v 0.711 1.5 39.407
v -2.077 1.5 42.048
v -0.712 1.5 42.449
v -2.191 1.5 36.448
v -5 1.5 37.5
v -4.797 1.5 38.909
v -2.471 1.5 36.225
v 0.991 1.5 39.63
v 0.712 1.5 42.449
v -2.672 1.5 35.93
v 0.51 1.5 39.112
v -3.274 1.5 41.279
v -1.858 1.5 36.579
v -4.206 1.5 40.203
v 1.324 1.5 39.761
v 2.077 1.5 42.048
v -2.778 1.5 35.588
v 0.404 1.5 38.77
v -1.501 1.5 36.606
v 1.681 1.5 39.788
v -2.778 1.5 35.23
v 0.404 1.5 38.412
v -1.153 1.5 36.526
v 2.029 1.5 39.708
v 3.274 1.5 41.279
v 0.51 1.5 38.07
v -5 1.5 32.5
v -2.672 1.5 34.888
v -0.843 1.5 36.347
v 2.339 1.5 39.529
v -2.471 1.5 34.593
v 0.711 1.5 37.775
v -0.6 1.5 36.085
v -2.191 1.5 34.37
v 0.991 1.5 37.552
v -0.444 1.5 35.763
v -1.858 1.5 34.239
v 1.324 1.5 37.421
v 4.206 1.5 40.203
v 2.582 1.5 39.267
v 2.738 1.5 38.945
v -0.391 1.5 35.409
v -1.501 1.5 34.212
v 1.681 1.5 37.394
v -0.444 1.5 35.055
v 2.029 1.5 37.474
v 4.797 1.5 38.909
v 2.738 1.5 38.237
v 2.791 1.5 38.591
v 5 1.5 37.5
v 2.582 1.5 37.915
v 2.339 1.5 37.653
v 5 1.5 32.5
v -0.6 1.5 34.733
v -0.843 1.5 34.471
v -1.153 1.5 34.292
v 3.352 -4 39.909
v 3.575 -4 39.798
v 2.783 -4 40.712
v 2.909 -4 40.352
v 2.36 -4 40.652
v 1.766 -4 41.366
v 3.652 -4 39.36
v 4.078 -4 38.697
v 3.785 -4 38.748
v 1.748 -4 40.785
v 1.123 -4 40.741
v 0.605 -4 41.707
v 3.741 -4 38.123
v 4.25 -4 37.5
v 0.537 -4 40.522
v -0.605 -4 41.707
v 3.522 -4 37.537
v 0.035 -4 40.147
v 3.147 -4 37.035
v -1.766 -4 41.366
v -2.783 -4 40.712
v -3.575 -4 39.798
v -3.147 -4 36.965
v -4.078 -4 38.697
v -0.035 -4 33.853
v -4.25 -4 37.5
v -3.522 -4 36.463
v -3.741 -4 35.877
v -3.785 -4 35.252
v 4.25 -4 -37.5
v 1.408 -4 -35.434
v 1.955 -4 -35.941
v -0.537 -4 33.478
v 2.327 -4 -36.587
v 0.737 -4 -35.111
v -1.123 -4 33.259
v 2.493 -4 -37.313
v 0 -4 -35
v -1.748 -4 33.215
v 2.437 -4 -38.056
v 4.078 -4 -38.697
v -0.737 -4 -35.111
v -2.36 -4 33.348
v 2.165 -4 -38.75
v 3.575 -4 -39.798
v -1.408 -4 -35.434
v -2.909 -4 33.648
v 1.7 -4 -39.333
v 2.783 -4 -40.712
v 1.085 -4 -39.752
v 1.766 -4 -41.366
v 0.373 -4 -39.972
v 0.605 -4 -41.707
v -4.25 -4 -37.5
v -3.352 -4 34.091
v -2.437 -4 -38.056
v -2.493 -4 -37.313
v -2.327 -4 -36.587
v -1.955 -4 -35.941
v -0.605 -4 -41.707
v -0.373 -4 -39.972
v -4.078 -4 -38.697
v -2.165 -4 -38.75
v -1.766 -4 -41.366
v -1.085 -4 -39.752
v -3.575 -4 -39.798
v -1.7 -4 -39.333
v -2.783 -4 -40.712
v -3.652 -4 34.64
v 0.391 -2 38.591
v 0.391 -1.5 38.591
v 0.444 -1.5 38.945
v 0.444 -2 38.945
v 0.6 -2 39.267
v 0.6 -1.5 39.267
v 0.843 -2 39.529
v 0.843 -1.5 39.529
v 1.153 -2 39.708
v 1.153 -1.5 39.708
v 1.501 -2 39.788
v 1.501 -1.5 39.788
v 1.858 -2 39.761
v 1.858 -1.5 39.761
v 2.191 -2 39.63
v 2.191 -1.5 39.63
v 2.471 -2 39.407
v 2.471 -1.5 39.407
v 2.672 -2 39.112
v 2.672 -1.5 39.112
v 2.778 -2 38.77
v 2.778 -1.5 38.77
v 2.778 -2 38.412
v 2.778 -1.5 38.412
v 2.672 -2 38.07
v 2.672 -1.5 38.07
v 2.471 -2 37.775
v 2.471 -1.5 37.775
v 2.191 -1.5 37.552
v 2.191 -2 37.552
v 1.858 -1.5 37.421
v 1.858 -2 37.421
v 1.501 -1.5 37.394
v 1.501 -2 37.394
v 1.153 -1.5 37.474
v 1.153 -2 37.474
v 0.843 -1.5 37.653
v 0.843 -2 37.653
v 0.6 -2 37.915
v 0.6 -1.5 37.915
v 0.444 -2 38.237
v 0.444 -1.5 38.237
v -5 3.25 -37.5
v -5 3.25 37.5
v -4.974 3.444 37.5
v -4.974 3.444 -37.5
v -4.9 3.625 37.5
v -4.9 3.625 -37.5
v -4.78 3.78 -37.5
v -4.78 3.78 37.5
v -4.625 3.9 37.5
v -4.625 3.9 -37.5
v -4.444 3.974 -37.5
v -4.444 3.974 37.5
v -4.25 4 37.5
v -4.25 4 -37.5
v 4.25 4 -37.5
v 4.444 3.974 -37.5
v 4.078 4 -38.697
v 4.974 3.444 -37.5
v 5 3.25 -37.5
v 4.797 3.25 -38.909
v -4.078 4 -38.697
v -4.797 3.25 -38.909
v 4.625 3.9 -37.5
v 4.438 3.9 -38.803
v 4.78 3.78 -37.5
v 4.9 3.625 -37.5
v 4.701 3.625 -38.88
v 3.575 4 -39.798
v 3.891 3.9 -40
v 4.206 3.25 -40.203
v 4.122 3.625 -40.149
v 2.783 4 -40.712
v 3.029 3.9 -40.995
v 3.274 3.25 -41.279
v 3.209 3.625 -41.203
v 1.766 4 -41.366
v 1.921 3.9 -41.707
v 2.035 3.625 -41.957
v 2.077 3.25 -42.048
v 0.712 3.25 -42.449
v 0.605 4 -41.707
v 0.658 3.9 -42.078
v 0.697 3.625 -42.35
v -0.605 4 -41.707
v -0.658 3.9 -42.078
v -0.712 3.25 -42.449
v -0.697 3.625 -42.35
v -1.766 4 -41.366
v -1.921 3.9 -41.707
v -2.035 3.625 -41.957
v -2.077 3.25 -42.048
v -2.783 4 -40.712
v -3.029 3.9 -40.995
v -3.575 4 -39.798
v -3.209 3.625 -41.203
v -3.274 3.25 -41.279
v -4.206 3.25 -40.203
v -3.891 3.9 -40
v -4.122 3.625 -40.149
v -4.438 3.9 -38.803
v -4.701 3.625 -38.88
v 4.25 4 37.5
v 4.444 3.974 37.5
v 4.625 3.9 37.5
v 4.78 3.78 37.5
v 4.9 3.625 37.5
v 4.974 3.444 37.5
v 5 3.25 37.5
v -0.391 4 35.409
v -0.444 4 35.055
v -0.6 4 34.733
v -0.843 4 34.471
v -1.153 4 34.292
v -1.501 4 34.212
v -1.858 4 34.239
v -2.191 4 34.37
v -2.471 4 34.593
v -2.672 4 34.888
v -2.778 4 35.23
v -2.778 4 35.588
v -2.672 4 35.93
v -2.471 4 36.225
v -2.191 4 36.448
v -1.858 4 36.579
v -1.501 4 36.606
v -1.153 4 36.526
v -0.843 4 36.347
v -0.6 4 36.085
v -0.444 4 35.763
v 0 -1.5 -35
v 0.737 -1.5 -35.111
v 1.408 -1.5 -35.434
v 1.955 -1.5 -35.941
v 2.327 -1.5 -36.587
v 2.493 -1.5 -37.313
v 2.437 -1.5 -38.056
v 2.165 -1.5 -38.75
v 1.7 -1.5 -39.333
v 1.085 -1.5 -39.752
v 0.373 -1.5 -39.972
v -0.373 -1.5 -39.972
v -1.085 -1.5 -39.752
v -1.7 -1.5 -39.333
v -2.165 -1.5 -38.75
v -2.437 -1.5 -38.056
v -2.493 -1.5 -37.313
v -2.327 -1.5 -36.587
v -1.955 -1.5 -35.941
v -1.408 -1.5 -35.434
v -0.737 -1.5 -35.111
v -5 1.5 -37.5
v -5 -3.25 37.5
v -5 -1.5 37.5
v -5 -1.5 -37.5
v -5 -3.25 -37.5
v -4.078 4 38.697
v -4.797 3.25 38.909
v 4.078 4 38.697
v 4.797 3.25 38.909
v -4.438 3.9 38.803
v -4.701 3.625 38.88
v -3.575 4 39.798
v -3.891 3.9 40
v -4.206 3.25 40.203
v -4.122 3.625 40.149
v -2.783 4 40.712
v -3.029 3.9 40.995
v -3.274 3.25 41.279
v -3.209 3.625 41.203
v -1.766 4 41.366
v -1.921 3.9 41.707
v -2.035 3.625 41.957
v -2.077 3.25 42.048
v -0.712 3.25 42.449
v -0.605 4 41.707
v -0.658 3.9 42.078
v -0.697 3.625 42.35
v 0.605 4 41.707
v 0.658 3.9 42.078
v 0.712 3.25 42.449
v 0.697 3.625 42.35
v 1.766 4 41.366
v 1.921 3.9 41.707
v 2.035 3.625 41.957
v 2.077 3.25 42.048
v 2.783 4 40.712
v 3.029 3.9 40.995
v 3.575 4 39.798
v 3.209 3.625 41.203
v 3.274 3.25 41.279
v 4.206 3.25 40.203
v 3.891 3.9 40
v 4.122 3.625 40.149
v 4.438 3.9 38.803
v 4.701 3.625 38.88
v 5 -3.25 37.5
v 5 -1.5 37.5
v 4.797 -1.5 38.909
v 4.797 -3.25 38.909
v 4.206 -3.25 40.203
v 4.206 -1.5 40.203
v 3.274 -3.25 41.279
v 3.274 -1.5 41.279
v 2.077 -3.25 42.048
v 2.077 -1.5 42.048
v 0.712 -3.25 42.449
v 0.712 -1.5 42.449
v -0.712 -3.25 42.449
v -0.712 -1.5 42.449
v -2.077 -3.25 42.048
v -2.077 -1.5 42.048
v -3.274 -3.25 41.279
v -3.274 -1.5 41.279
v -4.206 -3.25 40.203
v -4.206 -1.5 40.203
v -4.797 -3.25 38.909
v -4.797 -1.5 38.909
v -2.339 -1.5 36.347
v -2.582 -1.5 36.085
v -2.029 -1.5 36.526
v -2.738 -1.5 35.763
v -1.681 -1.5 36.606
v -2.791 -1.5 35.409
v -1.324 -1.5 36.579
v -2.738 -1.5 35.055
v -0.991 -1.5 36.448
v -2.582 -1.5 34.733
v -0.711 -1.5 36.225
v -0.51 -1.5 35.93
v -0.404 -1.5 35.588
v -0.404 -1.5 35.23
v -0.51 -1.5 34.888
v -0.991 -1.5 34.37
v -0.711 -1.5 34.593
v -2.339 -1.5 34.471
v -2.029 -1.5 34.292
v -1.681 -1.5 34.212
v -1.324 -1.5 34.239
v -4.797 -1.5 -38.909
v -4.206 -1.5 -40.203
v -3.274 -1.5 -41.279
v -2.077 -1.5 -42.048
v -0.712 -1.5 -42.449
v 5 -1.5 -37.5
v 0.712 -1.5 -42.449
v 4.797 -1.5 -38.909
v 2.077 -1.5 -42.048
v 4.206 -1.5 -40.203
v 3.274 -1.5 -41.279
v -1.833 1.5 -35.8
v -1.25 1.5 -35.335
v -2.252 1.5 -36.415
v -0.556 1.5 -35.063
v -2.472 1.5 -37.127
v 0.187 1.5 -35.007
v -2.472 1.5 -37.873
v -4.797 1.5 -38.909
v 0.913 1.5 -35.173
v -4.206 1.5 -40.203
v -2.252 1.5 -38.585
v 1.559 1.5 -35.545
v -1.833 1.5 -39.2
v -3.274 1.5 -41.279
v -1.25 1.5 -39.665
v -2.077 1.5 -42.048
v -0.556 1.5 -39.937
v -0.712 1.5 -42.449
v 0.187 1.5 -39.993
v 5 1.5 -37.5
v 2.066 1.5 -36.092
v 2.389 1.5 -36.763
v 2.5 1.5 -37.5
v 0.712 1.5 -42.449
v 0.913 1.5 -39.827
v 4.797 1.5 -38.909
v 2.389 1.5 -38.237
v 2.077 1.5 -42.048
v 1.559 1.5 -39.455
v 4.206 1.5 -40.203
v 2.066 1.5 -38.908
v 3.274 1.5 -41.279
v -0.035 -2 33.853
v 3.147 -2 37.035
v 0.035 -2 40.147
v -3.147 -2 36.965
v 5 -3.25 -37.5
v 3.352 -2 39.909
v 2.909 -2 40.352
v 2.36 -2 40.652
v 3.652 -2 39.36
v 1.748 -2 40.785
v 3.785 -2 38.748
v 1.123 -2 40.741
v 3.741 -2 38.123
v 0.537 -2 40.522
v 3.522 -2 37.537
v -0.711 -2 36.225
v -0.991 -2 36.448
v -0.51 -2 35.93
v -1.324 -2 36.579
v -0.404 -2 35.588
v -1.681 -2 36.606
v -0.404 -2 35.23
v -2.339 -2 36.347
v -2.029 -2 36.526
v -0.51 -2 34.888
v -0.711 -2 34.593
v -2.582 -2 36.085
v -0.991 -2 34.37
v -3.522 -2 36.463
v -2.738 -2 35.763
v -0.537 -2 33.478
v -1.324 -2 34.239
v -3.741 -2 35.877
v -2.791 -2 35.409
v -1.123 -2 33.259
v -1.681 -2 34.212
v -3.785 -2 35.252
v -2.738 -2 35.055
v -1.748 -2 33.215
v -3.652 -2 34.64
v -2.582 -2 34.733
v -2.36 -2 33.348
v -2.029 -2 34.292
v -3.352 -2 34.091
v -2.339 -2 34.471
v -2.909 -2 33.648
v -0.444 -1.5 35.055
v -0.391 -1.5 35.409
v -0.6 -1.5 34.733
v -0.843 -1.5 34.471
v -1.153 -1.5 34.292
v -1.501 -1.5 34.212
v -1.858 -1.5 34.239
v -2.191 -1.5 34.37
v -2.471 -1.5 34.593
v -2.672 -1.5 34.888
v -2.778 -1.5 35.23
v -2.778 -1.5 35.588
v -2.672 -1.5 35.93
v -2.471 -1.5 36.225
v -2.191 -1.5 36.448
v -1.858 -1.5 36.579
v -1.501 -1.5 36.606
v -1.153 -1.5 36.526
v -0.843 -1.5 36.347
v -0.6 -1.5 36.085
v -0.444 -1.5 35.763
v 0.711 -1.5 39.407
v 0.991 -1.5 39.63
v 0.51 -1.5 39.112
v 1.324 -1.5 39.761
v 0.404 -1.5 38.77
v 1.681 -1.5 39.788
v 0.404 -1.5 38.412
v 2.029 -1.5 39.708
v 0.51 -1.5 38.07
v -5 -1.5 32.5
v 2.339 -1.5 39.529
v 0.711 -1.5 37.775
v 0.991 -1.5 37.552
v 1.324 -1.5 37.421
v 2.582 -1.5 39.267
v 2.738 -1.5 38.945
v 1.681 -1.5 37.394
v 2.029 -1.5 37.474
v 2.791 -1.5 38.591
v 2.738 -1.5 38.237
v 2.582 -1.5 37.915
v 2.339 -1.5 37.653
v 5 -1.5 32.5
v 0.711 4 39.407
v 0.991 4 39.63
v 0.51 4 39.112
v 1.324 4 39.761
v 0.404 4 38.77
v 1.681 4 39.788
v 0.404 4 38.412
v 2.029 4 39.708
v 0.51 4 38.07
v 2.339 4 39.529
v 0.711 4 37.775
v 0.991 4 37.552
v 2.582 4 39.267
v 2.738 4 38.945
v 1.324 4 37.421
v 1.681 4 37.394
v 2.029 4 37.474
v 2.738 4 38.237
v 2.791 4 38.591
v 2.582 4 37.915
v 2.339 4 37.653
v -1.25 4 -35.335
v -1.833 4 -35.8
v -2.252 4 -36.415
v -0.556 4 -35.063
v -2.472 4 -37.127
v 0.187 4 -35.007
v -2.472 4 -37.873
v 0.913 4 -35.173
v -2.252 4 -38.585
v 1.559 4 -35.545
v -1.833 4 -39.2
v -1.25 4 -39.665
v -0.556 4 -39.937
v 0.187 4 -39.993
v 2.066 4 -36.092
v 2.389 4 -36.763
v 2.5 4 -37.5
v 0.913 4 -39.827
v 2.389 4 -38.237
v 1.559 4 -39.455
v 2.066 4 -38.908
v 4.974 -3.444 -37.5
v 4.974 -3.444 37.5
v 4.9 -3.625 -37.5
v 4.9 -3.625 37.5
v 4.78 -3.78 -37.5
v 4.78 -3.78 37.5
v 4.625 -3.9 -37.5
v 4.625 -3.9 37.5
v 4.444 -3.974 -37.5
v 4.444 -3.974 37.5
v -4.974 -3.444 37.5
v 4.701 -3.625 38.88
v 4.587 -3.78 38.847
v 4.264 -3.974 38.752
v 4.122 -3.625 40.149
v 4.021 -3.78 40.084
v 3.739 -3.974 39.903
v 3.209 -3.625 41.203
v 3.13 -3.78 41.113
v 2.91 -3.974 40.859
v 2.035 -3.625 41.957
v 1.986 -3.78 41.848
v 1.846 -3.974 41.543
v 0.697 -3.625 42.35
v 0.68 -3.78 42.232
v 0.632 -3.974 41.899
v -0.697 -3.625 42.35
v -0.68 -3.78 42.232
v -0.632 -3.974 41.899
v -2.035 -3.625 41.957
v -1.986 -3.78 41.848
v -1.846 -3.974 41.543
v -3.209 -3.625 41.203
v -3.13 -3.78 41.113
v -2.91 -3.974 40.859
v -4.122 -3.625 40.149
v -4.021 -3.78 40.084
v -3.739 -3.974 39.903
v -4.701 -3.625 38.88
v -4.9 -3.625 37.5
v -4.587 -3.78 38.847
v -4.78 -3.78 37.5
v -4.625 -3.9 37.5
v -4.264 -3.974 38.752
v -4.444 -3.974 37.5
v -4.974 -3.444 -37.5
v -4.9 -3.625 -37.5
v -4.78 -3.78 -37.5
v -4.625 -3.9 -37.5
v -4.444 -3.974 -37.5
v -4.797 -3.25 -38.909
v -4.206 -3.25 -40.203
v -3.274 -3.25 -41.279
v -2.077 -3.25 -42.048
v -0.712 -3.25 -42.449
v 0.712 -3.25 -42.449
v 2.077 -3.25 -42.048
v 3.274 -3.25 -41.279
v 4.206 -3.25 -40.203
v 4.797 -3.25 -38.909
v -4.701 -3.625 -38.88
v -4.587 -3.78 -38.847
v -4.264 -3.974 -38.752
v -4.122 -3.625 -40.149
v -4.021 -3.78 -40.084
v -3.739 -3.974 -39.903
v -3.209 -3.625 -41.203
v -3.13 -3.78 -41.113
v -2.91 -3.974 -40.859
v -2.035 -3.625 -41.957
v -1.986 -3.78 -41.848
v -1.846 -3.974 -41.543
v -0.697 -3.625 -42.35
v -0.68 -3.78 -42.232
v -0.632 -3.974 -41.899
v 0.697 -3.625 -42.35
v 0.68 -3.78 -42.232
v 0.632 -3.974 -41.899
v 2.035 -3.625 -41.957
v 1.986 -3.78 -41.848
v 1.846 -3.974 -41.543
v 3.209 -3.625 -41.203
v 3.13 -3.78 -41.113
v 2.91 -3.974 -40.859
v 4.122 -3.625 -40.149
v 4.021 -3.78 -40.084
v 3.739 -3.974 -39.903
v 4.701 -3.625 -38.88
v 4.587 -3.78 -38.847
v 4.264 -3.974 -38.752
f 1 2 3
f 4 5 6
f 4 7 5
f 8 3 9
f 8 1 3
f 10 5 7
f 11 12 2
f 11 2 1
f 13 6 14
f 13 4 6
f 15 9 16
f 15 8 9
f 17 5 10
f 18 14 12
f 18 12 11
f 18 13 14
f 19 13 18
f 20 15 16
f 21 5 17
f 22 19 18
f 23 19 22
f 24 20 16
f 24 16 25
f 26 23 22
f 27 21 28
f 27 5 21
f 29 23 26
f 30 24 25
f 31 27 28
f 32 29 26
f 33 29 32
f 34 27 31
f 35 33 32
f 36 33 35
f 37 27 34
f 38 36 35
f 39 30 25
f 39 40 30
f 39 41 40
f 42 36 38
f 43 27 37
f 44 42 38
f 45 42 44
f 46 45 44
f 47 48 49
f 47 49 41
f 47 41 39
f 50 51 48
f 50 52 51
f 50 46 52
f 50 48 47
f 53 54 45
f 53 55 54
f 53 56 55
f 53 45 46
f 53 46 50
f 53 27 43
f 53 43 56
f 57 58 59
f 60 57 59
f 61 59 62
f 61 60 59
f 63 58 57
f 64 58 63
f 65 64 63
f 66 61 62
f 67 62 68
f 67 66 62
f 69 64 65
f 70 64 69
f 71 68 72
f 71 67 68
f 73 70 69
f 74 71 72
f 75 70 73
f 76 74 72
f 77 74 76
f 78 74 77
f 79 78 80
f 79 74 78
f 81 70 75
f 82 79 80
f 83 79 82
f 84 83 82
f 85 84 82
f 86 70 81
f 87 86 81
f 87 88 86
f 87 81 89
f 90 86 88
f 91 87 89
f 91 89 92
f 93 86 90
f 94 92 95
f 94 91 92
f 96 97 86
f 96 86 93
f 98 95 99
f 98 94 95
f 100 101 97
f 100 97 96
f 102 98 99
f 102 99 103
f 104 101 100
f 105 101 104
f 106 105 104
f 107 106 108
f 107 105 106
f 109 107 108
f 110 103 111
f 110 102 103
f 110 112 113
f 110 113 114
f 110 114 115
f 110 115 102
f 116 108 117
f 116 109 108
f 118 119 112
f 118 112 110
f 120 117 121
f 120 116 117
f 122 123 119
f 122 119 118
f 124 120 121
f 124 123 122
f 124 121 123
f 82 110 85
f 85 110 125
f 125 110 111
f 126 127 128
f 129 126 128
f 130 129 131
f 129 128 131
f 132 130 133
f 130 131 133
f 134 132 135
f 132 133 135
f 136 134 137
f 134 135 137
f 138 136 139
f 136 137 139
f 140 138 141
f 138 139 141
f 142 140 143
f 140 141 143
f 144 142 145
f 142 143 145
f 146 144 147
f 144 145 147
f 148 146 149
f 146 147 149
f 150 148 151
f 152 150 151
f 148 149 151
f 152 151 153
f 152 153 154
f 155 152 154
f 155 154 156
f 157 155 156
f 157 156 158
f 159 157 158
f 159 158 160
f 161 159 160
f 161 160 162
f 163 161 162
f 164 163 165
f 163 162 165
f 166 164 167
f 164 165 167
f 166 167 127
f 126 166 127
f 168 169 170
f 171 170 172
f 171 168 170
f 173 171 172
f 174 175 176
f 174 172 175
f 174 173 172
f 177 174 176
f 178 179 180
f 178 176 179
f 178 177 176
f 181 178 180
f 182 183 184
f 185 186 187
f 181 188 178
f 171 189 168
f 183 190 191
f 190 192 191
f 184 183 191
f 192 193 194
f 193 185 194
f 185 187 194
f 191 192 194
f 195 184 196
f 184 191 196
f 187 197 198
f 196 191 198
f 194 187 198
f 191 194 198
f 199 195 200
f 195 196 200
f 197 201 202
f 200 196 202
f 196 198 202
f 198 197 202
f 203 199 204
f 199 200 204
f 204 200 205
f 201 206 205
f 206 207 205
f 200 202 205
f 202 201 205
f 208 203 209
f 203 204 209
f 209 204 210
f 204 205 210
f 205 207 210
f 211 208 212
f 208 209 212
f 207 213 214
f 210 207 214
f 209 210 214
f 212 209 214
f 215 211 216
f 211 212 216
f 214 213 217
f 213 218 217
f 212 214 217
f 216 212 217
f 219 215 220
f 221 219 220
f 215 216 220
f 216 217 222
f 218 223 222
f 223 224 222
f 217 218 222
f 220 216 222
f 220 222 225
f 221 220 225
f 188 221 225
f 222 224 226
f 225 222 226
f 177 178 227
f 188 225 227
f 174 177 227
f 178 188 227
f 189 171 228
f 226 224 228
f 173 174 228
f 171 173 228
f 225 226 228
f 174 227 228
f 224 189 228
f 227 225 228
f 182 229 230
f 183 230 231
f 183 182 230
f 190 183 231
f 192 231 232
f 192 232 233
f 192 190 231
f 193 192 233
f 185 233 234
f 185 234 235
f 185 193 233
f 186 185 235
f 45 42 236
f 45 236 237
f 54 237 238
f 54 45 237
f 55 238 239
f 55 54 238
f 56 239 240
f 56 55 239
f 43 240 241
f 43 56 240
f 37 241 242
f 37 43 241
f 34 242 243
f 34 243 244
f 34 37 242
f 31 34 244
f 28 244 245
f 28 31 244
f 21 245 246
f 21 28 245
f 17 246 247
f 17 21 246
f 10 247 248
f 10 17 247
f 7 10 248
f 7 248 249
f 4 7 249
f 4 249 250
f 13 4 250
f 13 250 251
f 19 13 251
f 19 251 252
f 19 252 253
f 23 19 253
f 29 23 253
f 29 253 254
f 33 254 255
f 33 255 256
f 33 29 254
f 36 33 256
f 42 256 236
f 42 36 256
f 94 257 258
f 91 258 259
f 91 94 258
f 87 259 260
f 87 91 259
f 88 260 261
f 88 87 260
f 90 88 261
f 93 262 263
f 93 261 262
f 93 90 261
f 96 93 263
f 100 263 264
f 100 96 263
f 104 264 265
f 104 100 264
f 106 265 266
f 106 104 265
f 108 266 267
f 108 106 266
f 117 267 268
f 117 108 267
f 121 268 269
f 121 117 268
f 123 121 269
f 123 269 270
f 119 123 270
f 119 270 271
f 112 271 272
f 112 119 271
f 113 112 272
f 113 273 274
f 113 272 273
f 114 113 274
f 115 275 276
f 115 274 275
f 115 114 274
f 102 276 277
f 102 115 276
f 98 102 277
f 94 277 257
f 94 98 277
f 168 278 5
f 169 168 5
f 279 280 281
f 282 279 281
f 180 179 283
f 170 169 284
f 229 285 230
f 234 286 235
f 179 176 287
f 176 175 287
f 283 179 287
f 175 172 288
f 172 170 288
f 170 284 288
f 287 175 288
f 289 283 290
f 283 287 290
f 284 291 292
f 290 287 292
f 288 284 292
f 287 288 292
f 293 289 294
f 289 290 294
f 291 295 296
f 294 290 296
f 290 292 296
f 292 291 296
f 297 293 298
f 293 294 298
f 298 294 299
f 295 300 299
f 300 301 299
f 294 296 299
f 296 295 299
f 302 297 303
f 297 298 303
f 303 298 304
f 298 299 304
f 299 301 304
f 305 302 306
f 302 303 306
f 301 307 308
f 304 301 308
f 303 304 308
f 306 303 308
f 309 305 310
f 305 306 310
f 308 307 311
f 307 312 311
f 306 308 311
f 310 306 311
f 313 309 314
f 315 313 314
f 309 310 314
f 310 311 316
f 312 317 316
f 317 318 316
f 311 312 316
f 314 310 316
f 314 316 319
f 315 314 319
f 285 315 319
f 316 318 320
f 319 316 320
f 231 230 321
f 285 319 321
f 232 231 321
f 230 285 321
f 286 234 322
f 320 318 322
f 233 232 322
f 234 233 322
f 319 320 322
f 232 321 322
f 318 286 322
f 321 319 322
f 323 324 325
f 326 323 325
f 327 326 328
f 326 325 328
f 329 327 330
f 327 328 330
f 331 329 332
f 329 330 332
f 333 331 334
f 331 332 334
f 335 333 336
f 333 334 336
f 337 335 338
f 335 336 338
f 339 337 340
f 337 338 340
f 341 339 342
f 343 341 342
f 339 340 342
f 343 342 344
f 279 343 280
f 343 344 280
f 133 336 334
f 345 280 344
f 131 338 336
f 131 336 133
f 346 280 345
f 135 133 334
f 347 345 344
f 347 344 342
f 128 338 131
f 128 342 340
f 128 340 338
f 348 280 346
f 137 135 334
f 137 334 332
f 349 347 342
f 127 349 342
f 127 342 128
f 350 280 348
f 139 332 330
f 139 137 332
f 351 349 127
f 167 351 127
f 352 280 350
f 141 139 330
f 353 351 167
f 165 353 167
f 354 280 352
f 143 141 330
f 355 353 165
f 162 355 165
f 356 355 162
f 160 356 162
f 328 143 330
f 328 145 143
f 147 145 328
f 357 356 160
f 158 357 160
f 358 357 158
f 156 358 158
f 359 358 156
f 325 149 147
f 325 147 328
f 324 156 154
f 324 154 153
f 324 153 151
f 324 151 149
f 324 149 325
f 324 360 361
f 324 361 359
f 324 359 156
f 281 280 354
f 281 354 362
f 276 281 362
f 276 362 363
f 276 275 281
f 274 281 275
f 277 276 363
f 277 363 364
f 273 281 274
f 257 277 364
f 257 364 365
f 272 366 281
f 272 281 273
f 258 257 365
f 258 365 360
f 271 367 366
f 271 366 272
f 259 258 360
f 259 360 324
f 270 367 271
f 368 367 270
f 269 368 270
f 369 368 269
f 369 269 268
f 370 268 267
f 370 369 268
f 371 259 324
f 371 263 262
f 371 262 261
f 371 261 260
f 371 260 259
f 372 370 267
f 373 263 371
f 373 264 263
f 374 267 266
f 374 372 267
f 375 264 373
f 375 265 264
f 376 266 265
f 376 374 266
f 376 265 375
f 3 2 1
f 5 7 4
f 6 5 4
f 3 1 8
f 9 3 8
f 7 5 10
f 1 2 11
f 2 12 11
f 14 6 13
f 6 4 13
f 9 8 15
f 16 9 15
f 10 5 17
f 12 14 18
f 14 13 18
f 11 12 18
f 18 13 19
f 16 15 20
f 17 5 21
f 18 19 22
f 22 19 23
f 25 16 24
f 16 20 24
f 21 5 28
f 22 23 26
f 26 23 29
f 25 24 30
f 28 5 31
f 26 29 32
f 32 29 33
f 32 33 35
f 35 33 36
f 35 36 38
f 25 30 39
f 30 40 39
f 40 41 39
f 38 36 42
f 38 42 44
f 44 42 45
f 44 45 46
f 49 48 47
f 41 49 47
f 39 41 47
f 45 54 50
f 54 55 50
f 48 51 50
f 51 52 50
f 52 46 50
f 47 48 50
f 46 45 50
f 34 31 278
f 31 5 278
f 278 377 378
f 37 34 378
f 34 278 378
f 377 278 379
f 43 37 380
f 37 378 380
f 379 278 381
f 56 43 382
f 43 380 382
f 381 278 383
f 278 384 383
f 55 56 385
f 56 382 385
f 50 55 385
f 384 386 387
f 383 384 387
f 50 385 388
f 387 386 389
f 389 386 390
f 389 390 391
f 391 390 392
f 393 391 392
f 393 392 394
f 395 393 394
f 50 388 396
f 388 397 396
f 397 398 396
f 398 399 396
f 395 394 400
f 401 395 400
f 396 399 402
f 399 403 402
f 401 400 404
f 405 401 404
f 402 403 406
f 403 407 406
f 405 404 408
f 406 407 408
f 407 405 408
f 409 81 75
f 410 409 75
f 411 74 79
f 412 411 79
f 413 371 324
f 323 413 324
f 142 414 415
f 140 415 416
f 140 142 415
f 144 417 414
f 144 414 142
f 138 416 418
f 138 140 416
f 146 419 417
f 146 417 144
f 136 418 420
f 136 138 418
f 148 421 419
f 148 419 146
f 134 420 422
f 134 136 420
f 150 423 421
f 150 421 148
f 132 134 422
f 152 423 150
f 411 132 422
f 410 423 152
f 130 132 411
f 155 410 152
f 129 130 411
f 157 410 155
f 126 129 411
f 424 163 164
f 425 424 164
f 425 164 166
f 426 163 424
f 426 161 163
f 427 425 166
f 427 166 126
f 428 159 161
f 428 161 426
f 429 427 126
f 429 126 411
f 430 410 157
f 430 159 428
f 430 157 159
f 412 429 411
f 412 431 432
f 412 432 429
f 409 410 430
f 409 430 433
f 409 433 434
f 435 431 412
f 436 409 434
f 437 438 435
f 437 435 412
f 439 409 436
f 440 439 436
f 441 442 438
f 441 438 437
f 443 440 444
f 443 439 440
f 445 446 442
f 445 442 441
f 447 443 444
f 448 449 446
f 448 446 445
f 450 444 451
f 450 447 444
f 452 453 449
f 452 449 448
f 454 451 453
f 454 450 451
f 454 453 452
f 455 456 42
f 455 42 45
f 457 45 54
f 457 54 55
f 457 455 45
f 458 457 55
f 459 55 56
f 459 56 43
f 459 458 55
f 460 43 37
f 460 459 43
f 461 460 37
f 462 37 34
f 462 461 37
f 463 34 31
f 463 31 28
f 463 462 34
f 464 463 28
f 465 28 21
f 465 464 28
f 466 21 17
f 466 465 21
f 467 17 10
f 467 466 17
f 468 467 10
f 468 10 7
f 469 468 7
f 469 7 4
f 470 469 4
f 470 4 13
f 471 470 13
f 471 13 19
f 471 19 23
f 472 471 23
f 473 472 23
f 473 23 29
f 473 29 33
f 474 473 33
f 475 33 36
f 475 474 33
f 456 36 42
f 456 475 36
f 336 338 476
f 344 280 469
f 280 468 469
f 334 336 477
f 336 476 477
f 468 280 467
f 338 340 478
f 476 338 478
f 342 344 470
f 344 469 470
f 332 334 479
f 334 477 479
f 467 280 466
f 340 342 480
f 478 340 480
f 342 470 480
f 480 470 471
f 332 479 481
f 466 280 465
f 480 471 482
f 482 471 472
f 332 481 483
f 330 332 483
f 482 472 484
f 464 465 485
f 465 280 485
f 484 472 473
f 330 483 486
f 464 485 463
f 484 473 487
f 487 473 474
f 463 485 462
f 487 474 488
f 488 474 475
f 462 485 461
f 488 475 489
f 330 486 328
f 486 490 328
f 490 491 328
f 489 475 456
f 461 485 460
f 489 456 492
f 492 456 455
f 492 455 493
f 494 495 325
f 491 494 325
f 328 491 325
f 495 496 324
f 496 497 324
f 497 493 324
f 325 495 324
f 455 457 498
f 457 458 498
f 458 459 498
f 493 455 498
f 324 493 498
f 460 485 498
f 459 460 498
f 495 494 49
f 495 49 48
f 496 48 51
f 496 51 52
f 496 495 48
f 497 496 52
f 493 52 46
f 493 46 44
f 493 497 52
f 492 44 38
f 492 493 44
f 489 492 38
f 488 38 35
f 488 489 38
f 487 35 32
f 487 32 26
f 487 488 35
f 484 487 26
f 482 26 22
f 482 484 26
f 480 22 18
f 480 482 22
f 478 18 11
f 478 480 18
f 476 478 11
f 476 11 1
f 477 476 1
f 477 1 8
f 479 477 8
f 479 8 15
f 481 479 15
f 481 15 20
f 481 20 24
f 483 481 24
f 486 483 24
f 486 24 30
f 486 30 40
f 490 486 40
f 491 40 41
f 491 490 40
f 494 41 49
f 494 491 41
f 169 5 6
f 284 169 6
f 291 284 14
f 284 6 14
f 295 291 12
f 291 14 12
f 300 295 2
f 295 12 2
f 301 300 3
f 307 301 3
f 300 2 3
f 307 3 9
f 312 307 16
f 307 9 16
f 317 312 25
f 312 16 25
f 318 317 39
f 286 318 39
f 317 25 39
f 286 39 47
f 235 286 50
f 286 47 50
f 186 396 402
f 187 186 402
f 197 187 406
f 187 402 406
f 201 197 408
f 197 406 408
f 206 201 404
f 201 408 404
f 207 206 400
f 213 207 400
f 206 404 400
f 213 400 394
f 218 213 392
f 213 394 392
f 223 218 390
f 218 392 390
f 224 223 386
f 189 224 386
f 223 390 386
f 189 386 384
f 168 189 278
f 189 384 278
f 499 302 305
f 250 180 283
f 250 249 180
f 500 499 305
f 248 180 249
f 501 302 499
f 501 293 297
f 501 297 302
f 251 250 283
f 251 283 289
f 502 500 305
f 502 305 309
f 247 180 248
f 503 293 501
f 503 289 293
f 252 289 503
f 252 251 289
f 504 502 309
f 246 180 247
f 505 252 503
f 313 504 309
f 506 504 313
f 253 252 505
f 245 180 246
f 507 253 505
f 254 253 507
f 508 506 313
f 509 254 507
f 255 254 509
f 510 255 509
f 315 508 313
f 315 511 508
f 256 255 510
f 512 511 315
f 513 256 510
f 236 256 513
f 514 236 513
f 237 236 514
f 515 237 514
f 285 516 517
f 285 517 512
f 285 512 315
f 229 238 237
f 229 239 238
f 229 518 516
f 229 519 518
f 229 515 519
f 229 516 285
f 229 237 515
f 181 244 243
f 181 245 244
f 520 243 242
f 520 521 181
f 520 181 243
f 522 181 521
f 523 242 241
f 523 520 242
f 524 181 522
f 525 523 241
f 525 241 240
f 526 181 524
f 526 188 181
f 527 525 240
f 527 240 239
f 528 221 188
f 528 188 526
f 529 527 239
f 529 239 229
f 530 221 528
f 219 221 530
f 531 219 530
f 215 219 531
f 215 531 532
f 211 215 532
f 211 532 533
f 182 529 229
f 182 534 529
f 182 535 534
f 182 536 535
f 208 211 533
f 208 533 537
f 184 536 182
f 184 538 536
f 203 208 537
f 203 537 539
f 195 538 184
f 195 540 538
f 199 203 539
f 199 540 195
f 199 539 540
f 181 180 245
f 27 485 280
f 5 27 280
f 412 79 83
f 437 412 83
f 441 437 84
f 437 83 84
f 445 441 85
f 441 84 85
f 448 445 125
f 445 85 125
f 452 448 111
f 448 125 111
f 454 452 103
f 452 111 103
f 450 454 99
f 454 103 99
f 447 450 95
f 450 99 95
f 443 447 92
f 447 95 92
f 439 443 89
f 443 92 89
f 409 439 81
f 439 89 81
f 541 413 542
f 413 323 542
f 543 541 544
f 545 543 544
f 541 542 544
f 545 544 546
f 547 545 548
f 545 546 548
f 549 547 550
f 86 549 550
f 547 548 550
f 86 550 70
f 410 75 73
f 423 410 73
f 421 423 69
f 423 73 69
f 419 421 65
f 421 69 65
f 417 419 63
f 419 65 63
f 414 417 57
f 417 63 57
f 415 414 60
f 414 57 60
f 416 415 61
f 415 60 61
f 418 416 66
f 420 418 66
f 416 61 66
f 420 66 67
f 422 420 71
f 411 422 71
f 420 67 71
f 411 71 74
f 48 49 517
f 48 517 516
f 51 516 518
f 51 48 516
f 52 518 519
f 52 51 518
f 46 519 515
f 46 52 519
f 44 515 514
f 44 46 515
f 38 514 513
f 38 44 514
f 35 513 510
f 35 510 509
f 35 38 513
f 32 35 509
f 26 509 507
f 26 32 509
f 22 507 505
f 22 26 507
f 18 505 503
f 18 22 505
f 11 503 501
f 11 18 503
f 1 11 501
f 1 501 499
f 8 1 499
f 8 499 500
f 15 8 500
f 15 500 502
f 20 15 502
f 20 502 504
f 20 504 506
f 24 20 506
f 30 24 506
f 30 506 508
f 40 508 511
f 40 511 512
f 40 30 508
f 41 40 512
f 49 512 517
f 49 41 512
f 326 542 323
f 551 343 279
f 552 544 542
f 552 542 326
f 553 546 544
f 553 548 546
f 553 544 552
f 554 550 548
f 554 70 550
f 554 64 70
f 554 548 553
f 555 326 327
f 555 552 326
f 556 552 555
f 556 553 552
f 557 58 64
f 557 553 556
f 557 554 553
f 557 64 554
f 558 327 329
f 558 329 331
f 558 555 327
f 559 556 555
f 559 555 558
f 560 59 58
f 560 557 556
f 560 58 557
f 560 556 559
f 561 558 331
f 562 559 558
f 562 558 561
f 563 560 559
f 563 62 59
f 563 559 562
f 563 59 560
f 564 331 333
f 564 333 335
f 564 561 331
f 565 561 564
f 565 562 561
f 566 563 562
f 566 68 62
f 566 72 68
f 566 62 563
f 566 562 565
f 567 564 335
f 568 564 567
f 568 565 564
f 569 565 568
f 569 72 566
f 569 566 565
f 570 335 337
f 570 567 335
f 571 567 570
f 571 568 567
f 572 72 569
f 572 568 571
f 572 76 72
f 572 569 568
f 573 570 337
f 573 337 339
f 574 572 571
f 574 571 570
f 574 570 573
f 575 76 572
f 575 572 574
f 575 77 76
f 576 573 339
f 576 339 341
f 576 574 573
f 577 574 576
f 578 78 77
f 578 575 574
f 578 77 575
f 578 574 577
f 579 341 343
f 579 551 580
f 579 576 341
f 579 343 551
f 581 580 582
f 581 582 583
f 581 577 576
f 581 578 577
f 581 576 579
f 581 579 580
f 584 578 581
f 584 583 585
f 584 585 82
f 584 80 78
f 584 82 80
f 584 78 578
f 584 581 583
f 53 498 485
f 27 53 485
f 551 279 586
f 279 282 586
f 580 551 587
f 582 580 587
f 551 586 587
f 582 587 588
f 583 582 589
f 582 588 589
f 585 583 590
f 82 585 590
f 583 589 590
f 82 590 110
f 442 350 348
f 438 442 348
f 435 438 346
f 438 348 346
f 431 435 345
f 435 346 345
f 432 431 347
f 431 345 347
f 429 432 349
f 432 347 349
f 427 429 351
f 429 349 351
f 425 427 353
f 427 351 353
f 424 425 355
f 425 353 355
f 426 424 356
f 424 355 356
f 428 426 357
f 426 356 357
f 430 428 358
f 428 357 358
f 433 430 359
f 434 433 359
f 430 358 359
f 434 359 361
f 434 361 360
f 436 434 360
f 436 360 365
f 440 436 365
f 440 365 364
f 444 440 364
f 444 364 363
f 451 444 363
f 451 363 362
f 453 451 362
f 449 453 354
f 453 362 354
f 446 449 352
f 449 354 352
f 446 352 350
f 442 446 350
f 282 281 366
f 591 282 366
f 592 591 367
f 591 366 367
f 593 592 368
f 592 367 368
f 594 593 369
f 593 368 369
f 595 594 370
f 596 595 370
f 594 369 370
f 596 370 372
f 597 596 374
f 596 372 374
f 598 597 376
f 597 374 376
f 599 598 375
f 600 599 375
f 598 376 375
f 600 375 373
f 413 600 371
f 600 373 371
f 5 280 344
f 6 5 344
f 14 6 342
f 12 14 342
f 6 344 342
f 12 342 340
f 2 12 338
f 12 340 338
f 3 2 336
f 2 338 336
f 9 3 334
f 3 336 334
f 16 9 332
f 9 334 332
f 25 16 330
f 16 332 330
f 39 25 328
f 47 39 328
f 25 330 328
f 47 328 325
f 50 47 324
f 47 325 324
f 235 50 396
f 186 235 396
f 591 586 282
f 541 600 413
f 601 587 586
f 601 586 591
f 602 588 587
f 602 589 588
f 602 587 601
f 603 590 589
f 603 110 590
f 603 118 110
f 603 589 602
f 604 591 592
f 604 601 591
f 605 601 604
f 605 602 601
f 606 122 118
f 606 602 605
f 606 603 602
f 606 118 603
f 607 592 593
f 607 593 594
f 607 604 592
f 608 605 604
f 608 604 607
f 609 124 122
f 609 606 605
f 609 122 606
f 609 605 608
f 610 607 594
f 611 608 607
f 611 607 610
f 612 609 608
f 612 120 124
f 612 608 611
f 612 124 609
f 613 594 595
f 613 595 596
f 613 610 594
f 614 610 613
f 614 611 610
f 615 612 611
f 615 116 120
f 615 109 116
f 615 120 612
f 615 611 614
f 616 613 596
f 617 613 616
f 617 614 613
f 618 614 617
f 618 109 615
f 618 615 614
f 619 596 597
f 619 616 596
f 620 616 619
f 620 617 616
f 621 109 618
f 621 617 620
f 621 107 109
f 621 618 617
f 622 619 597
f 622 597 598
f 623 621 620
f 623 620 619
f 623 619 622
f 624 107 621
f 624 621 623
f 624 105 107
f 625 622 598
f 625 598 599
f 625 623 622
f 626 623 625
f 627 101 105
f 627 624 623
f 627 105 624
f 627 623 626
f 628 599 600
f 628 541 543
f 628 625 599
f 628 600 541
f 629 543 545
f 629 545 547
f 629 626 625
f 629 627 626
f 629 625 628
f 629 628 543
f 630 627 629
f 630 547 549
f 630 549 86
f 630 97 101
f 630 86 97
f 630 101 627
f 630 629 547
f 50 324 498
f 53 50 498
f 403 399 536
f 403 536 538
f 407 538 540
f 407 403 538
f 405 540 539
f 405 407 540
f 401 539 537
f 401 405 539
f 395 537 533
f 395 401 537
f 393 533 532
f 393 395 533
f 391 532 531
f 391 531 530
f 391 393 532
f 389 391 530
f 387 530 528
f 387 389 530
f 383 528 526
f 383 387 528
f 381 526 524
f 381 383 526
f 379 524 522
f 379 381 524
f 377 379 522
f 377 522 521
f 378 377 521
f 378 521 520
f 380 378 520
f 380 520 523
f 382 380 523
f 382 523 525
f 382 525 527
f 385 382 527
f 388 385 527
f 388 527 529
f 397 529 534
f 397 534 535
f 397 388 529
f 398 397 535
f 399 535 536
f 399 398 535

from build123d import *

# Parameters (mm, degrees)
SKETCH1_R                                       = 2.5
BOSS_EXTRUDE1_DEPTH                             = 4
CUT_EXTRUDE1_START                              = -42.5
SKETCH2_W                                       = 10
SKETCH2_H                                       = 3
CUT_EXTRUDE1_DEPTH                              = 75
CSK_FOR_M2_FLAT_HEAD_MACHINE_SCREW1_D           = 2.4
CSK_FOR_M2_FLAT_HEAD_MACHINE_SCREW1_CSINK_D     = 4.4
CSK_FOR_M2_FLAT_HEAD_MACHINE_SCREW1_CSINK_ANGLE = 90
CUT_EXTRUDE2_DEPTH                              = 2
FILLET1_R                                       = 0.75
SPLIT1_START                                    = -1.5
SPLIT1_OUTLINE_R                                = 1.2
SPLIT1_DEPTH                                    = 3
SPLIT1_2_OUTLINE_R                              = 2.5
SPLIT1_2_OUTLINE_R_2                            = 1.2
SPLIT1_2_DEPTH                                  = 5.5
SPLIT1_START_2                                  = 1.5
SPLIT1_3_OUTLINE_R                              = 1.2
SPLIT1_3_OUTLINE_R_2                            = 2.5
SPLIT1_3_DEPTH                                  = 2.5
SPLIT1_START_3                                  = -42.5000001
SPLIT1_4_DEPTH                                  = 85.0000001
SPLIT1_5_ANGLE                                  = 180
SPLIT1_6_ANGLE                                  = 180


with BuildPart() as part:
    # Sketch1 → Boss-Extrude1 (new, symmetric)
    with BuildSketch(Plane(origin=(0, 0, 0), x_dir=(1, 0, 0), z_dir=(0, 1, 0))):
        with BuildLine():
            Line((5, 37.5), (5, -37.5))
            ThreePointArc((5, -37.5), (0, -42.5), (-5, -37.5))
            Line((-5, -37.5), (-5, 37.5))
            ThreePointArc((-5, 37.5), (0, 42.5), (5, 37.5))
        make_face()
        with Locations(Location((0, 37.5, 0), (0, 0, 270))):
            Circle(SKETCH1_R, mode=Mode.SUBTRACT)
    extrude(amount=BOSS_EXTRUDE1_DEPTH, both=True)

    # Sketch2 → Cut-Extrude1 (cut)
    with BuildSketch(Plane.XY.offset(CUT_EXTRUDE1_START)):
        Rectangle(SKETCH2_W, SKETCH2_H)
    extrude(amount=CUT_EXTRUDE1_DEPTH, mode=Mode.SUBTRACT)

    # CSK for M2 Flat Head Machine Screw1 (through all)
    with Locations(Plane.XZ.offset(4)):
        with Locations((-1.590990258, 35.409009742), (1.590990258, 38.590990258)):
            CounterSinkHole(CSK_FOR_M2_FLAT_HEAD_MACHINE_SCREW1_D / 2, CSK_FOR_M2_FLAT_HEAD_MACHINE_SCREW1_CSINK_D / 2, counter_sink_angle=CSK_FOR_M2_FLAT_HEAD_MACHINE_SCREW1_CSINK_ANGLE)

    # Sketch7 → Cut-Extrude2 (cut)
    with BuildSketch(Plane(origin=(0, -4, 0), x_dir=(1, 0, 0), z_dir=(0, 1, 0))):
        with BuildLine():
            Line((-0.035355339, -33.853374824), (3.146625176, -37.035355339))
            ThreePointArc((3.146625176, -37.035355339), (3.146625176, -40.146625176), (0.035355339, -40.146625176))
            Line((0.035355339, -40.146625176), (-3.146625176, -36.964644661))
            ThreePointArc((-3.146625176, -36.964644661), (-3.146625176, -33.853374824), (-0.035355339, -33.853374824))
        make_face()
    extrude(amount=CUT_EXTRUDE2_DEPTH, mode=Mode.SUBTRACT)

    # Fillet1
    fillet1_edges = [part.edges().sort_by_distance(p)[0] for p in [
        (0, 4, 42.5),
        (5, 4, 0),
        (0, 4, -42.5),
        (5, -4, 0),
        (0, -4, 42.5),
        (-5, -4, 0),
        (0, -4, -42.5),
        (-5, 4, 0),
    ]]
    fillet(fillet1_edges, radius=FILLET1_R)

    # Split1 2 outline → Split1 2 (cut)
    with BuildSketch(Plane(origin=(0, 0, 0), x_dir=(1, 0, 0), z_dir=(0, 1, 0)).offset(SPLIT1_START)):
        with BuildLine():
            ThreePointArc((5, 37.5), (0, 42.5), (-5, 37.5))
            Line((-5, 37.5), (-5, -37.5))
            ThreePointArc((-5, -37.5), (0, -42.5), (5, -37.5))
            Line((5, -37.5), (5, 37.5))
        make_face()
        with Locations((0, 37.5)):
            Circle(SPLIT1_2_OUTLINE_R, mode=Mode.SUBTRACT)
        with Locations((1.590990258, -38.590990258)):
            Circle(SPLIT1_2_OUTLINE_R_2, mode=Mode.SUBTRACT)
        with Locations((-1.590990258, -35.409009742)):
            Circle(SPLIT1_2_OUTLINE_R_2, mode=Mode.SUBTRACT)
    extrude(amount=SPLIT1_2_DEPTH, mode=Mode.SUBTRACT)


with BuildPart() as body_2:
    # Split1: read off the stored shape, not the designer's step
    # Split1 outline → Split1 (new body)
    with BuildSketch(Plane(origin=(0, 0, 0), x_dir=(1, 0, 0), z_dir=(0, 1, 0)).offset(SPLIT1_START)):
        with BuildLine():
            Line((5, -32.5), (-5, -32.5))
            Line((-5, -32.5), (-5, -37.5))
            ThreePointArc((-5, -37.5), (0, -42.5), (5, -37.5))
            Line((5, -37.5), (5, -32.5))
        make_face()
        with Locations((1.590990258, -38.590990258)):
            Circle(SPLIT1_OUTLINE_R, mode=Mode.SUBTRACT)
        with Locations((-1.590990258, -35.409009742)):
            Circle(SPLIT1_OUTLINE_R, mode=Mode.SUBTRACT)
    extrude(amount=SPLIT1_DEPTH)


with BuildPart() as body_3:
    # Split1 3 outline → Split1 3 (new body)
    with BuildSketch(Plane(origin=(0, 0, 0), x_dir=(1, 0, 0), z_dir=(0, 1, 0)).offset(SPLIT1_START_2)):
        with BuildLine():
            ThreePointArc((5, 37.5), (0, 42.5), (-5, 37.5))
            Line((-5, 37.5), (-5, -37.5))
            ThreePointArc((-5, -37.5), (0, -42.5), (5, -37.5))
            Line((5, -37.5), (5, 37.5))
        make_face()
        with Locations((-1.590990258, -35.409009742)):
            Circle(SPLIT1_3_OUTLINE_R, mode=Mode.SUBTRACT)
        with Locations((1.590990258, -38.590990258)):
            Circle(SPLIT1_3_OUTLINE_R, mode=Mode.SUBTRACT)
        with Locations((0, 37.5)):
            Circle(SPLIT1_3_OUTLINE_R_2, mode=Mode.SUBTRACT)
    extrude(amount=SPLIT1_3_DEPTH)

    # Split1 4 outline → Split1 4 (cut)
    with BuildSketch(Plane.XY.offset(SPLIT1_START_3)):
        with BuildLine():
            ThreePointArc((-5, 3.25), (-4.780330086, 3.780330086), (-4.25, 4))
            Line((-4.25, 4), (-5, 4))
            Line((-5, 4), (-5, 3.25))
        make_face()
        with BuildLine():
            ThreePointArc((4.25, 4), (4.780330086, 3.780330086), (5, 3.25))
            Line((5, 3.25), (5, 4))
            Line((5, 4), (4.25, 4))
        make_face()
    extrude(amount=SPLIT1_4_DEPTH, mode=Mode.SUBTRACT)

    # Split1 5 outline → Split1 5 (revolve, cut)
    with BuildSketch(Plane(origin=(0, 0, 37.5), x_dir=(-1, 0, 0), z_dir=(0, 0, -1))):
        with BuildLine():
            ThreePointArc((4.25, 4), (4.780330086, 3.780330086), (5, 3.25))
            Line((5, 3.25), (5, 4))
            Line((5, 4), (4.25, 4))
        make_face()
    revolve(axis=Axis((0, 0, 37.5), (0, 1, 0)), revolution_arc=SPLIT1_5_ANGLE, mode=Mode.SUBTRACT)

    # Split1 6 outline → Split1 6 (revolve, cut)
    with BuildSketch(Plane.XY.offset(-37.5)):
        with BuildLine():
            ThreePointArc((4.25, 4), (4.780330086, 3.780330086), (5, 3.25))
            Line((5, 3.25), (5, 4))
            Line((5, 4), (4.25, 4))
        make_face()
    revolve(axis=Axis((0, 0, -37.5), (0, 1, 0)), revolution_arc=SPLIT1_6_ANGLE, mode=Mode.SUBTRACT)


solid = Compound([part.part, body_2.part, body_3.part])
